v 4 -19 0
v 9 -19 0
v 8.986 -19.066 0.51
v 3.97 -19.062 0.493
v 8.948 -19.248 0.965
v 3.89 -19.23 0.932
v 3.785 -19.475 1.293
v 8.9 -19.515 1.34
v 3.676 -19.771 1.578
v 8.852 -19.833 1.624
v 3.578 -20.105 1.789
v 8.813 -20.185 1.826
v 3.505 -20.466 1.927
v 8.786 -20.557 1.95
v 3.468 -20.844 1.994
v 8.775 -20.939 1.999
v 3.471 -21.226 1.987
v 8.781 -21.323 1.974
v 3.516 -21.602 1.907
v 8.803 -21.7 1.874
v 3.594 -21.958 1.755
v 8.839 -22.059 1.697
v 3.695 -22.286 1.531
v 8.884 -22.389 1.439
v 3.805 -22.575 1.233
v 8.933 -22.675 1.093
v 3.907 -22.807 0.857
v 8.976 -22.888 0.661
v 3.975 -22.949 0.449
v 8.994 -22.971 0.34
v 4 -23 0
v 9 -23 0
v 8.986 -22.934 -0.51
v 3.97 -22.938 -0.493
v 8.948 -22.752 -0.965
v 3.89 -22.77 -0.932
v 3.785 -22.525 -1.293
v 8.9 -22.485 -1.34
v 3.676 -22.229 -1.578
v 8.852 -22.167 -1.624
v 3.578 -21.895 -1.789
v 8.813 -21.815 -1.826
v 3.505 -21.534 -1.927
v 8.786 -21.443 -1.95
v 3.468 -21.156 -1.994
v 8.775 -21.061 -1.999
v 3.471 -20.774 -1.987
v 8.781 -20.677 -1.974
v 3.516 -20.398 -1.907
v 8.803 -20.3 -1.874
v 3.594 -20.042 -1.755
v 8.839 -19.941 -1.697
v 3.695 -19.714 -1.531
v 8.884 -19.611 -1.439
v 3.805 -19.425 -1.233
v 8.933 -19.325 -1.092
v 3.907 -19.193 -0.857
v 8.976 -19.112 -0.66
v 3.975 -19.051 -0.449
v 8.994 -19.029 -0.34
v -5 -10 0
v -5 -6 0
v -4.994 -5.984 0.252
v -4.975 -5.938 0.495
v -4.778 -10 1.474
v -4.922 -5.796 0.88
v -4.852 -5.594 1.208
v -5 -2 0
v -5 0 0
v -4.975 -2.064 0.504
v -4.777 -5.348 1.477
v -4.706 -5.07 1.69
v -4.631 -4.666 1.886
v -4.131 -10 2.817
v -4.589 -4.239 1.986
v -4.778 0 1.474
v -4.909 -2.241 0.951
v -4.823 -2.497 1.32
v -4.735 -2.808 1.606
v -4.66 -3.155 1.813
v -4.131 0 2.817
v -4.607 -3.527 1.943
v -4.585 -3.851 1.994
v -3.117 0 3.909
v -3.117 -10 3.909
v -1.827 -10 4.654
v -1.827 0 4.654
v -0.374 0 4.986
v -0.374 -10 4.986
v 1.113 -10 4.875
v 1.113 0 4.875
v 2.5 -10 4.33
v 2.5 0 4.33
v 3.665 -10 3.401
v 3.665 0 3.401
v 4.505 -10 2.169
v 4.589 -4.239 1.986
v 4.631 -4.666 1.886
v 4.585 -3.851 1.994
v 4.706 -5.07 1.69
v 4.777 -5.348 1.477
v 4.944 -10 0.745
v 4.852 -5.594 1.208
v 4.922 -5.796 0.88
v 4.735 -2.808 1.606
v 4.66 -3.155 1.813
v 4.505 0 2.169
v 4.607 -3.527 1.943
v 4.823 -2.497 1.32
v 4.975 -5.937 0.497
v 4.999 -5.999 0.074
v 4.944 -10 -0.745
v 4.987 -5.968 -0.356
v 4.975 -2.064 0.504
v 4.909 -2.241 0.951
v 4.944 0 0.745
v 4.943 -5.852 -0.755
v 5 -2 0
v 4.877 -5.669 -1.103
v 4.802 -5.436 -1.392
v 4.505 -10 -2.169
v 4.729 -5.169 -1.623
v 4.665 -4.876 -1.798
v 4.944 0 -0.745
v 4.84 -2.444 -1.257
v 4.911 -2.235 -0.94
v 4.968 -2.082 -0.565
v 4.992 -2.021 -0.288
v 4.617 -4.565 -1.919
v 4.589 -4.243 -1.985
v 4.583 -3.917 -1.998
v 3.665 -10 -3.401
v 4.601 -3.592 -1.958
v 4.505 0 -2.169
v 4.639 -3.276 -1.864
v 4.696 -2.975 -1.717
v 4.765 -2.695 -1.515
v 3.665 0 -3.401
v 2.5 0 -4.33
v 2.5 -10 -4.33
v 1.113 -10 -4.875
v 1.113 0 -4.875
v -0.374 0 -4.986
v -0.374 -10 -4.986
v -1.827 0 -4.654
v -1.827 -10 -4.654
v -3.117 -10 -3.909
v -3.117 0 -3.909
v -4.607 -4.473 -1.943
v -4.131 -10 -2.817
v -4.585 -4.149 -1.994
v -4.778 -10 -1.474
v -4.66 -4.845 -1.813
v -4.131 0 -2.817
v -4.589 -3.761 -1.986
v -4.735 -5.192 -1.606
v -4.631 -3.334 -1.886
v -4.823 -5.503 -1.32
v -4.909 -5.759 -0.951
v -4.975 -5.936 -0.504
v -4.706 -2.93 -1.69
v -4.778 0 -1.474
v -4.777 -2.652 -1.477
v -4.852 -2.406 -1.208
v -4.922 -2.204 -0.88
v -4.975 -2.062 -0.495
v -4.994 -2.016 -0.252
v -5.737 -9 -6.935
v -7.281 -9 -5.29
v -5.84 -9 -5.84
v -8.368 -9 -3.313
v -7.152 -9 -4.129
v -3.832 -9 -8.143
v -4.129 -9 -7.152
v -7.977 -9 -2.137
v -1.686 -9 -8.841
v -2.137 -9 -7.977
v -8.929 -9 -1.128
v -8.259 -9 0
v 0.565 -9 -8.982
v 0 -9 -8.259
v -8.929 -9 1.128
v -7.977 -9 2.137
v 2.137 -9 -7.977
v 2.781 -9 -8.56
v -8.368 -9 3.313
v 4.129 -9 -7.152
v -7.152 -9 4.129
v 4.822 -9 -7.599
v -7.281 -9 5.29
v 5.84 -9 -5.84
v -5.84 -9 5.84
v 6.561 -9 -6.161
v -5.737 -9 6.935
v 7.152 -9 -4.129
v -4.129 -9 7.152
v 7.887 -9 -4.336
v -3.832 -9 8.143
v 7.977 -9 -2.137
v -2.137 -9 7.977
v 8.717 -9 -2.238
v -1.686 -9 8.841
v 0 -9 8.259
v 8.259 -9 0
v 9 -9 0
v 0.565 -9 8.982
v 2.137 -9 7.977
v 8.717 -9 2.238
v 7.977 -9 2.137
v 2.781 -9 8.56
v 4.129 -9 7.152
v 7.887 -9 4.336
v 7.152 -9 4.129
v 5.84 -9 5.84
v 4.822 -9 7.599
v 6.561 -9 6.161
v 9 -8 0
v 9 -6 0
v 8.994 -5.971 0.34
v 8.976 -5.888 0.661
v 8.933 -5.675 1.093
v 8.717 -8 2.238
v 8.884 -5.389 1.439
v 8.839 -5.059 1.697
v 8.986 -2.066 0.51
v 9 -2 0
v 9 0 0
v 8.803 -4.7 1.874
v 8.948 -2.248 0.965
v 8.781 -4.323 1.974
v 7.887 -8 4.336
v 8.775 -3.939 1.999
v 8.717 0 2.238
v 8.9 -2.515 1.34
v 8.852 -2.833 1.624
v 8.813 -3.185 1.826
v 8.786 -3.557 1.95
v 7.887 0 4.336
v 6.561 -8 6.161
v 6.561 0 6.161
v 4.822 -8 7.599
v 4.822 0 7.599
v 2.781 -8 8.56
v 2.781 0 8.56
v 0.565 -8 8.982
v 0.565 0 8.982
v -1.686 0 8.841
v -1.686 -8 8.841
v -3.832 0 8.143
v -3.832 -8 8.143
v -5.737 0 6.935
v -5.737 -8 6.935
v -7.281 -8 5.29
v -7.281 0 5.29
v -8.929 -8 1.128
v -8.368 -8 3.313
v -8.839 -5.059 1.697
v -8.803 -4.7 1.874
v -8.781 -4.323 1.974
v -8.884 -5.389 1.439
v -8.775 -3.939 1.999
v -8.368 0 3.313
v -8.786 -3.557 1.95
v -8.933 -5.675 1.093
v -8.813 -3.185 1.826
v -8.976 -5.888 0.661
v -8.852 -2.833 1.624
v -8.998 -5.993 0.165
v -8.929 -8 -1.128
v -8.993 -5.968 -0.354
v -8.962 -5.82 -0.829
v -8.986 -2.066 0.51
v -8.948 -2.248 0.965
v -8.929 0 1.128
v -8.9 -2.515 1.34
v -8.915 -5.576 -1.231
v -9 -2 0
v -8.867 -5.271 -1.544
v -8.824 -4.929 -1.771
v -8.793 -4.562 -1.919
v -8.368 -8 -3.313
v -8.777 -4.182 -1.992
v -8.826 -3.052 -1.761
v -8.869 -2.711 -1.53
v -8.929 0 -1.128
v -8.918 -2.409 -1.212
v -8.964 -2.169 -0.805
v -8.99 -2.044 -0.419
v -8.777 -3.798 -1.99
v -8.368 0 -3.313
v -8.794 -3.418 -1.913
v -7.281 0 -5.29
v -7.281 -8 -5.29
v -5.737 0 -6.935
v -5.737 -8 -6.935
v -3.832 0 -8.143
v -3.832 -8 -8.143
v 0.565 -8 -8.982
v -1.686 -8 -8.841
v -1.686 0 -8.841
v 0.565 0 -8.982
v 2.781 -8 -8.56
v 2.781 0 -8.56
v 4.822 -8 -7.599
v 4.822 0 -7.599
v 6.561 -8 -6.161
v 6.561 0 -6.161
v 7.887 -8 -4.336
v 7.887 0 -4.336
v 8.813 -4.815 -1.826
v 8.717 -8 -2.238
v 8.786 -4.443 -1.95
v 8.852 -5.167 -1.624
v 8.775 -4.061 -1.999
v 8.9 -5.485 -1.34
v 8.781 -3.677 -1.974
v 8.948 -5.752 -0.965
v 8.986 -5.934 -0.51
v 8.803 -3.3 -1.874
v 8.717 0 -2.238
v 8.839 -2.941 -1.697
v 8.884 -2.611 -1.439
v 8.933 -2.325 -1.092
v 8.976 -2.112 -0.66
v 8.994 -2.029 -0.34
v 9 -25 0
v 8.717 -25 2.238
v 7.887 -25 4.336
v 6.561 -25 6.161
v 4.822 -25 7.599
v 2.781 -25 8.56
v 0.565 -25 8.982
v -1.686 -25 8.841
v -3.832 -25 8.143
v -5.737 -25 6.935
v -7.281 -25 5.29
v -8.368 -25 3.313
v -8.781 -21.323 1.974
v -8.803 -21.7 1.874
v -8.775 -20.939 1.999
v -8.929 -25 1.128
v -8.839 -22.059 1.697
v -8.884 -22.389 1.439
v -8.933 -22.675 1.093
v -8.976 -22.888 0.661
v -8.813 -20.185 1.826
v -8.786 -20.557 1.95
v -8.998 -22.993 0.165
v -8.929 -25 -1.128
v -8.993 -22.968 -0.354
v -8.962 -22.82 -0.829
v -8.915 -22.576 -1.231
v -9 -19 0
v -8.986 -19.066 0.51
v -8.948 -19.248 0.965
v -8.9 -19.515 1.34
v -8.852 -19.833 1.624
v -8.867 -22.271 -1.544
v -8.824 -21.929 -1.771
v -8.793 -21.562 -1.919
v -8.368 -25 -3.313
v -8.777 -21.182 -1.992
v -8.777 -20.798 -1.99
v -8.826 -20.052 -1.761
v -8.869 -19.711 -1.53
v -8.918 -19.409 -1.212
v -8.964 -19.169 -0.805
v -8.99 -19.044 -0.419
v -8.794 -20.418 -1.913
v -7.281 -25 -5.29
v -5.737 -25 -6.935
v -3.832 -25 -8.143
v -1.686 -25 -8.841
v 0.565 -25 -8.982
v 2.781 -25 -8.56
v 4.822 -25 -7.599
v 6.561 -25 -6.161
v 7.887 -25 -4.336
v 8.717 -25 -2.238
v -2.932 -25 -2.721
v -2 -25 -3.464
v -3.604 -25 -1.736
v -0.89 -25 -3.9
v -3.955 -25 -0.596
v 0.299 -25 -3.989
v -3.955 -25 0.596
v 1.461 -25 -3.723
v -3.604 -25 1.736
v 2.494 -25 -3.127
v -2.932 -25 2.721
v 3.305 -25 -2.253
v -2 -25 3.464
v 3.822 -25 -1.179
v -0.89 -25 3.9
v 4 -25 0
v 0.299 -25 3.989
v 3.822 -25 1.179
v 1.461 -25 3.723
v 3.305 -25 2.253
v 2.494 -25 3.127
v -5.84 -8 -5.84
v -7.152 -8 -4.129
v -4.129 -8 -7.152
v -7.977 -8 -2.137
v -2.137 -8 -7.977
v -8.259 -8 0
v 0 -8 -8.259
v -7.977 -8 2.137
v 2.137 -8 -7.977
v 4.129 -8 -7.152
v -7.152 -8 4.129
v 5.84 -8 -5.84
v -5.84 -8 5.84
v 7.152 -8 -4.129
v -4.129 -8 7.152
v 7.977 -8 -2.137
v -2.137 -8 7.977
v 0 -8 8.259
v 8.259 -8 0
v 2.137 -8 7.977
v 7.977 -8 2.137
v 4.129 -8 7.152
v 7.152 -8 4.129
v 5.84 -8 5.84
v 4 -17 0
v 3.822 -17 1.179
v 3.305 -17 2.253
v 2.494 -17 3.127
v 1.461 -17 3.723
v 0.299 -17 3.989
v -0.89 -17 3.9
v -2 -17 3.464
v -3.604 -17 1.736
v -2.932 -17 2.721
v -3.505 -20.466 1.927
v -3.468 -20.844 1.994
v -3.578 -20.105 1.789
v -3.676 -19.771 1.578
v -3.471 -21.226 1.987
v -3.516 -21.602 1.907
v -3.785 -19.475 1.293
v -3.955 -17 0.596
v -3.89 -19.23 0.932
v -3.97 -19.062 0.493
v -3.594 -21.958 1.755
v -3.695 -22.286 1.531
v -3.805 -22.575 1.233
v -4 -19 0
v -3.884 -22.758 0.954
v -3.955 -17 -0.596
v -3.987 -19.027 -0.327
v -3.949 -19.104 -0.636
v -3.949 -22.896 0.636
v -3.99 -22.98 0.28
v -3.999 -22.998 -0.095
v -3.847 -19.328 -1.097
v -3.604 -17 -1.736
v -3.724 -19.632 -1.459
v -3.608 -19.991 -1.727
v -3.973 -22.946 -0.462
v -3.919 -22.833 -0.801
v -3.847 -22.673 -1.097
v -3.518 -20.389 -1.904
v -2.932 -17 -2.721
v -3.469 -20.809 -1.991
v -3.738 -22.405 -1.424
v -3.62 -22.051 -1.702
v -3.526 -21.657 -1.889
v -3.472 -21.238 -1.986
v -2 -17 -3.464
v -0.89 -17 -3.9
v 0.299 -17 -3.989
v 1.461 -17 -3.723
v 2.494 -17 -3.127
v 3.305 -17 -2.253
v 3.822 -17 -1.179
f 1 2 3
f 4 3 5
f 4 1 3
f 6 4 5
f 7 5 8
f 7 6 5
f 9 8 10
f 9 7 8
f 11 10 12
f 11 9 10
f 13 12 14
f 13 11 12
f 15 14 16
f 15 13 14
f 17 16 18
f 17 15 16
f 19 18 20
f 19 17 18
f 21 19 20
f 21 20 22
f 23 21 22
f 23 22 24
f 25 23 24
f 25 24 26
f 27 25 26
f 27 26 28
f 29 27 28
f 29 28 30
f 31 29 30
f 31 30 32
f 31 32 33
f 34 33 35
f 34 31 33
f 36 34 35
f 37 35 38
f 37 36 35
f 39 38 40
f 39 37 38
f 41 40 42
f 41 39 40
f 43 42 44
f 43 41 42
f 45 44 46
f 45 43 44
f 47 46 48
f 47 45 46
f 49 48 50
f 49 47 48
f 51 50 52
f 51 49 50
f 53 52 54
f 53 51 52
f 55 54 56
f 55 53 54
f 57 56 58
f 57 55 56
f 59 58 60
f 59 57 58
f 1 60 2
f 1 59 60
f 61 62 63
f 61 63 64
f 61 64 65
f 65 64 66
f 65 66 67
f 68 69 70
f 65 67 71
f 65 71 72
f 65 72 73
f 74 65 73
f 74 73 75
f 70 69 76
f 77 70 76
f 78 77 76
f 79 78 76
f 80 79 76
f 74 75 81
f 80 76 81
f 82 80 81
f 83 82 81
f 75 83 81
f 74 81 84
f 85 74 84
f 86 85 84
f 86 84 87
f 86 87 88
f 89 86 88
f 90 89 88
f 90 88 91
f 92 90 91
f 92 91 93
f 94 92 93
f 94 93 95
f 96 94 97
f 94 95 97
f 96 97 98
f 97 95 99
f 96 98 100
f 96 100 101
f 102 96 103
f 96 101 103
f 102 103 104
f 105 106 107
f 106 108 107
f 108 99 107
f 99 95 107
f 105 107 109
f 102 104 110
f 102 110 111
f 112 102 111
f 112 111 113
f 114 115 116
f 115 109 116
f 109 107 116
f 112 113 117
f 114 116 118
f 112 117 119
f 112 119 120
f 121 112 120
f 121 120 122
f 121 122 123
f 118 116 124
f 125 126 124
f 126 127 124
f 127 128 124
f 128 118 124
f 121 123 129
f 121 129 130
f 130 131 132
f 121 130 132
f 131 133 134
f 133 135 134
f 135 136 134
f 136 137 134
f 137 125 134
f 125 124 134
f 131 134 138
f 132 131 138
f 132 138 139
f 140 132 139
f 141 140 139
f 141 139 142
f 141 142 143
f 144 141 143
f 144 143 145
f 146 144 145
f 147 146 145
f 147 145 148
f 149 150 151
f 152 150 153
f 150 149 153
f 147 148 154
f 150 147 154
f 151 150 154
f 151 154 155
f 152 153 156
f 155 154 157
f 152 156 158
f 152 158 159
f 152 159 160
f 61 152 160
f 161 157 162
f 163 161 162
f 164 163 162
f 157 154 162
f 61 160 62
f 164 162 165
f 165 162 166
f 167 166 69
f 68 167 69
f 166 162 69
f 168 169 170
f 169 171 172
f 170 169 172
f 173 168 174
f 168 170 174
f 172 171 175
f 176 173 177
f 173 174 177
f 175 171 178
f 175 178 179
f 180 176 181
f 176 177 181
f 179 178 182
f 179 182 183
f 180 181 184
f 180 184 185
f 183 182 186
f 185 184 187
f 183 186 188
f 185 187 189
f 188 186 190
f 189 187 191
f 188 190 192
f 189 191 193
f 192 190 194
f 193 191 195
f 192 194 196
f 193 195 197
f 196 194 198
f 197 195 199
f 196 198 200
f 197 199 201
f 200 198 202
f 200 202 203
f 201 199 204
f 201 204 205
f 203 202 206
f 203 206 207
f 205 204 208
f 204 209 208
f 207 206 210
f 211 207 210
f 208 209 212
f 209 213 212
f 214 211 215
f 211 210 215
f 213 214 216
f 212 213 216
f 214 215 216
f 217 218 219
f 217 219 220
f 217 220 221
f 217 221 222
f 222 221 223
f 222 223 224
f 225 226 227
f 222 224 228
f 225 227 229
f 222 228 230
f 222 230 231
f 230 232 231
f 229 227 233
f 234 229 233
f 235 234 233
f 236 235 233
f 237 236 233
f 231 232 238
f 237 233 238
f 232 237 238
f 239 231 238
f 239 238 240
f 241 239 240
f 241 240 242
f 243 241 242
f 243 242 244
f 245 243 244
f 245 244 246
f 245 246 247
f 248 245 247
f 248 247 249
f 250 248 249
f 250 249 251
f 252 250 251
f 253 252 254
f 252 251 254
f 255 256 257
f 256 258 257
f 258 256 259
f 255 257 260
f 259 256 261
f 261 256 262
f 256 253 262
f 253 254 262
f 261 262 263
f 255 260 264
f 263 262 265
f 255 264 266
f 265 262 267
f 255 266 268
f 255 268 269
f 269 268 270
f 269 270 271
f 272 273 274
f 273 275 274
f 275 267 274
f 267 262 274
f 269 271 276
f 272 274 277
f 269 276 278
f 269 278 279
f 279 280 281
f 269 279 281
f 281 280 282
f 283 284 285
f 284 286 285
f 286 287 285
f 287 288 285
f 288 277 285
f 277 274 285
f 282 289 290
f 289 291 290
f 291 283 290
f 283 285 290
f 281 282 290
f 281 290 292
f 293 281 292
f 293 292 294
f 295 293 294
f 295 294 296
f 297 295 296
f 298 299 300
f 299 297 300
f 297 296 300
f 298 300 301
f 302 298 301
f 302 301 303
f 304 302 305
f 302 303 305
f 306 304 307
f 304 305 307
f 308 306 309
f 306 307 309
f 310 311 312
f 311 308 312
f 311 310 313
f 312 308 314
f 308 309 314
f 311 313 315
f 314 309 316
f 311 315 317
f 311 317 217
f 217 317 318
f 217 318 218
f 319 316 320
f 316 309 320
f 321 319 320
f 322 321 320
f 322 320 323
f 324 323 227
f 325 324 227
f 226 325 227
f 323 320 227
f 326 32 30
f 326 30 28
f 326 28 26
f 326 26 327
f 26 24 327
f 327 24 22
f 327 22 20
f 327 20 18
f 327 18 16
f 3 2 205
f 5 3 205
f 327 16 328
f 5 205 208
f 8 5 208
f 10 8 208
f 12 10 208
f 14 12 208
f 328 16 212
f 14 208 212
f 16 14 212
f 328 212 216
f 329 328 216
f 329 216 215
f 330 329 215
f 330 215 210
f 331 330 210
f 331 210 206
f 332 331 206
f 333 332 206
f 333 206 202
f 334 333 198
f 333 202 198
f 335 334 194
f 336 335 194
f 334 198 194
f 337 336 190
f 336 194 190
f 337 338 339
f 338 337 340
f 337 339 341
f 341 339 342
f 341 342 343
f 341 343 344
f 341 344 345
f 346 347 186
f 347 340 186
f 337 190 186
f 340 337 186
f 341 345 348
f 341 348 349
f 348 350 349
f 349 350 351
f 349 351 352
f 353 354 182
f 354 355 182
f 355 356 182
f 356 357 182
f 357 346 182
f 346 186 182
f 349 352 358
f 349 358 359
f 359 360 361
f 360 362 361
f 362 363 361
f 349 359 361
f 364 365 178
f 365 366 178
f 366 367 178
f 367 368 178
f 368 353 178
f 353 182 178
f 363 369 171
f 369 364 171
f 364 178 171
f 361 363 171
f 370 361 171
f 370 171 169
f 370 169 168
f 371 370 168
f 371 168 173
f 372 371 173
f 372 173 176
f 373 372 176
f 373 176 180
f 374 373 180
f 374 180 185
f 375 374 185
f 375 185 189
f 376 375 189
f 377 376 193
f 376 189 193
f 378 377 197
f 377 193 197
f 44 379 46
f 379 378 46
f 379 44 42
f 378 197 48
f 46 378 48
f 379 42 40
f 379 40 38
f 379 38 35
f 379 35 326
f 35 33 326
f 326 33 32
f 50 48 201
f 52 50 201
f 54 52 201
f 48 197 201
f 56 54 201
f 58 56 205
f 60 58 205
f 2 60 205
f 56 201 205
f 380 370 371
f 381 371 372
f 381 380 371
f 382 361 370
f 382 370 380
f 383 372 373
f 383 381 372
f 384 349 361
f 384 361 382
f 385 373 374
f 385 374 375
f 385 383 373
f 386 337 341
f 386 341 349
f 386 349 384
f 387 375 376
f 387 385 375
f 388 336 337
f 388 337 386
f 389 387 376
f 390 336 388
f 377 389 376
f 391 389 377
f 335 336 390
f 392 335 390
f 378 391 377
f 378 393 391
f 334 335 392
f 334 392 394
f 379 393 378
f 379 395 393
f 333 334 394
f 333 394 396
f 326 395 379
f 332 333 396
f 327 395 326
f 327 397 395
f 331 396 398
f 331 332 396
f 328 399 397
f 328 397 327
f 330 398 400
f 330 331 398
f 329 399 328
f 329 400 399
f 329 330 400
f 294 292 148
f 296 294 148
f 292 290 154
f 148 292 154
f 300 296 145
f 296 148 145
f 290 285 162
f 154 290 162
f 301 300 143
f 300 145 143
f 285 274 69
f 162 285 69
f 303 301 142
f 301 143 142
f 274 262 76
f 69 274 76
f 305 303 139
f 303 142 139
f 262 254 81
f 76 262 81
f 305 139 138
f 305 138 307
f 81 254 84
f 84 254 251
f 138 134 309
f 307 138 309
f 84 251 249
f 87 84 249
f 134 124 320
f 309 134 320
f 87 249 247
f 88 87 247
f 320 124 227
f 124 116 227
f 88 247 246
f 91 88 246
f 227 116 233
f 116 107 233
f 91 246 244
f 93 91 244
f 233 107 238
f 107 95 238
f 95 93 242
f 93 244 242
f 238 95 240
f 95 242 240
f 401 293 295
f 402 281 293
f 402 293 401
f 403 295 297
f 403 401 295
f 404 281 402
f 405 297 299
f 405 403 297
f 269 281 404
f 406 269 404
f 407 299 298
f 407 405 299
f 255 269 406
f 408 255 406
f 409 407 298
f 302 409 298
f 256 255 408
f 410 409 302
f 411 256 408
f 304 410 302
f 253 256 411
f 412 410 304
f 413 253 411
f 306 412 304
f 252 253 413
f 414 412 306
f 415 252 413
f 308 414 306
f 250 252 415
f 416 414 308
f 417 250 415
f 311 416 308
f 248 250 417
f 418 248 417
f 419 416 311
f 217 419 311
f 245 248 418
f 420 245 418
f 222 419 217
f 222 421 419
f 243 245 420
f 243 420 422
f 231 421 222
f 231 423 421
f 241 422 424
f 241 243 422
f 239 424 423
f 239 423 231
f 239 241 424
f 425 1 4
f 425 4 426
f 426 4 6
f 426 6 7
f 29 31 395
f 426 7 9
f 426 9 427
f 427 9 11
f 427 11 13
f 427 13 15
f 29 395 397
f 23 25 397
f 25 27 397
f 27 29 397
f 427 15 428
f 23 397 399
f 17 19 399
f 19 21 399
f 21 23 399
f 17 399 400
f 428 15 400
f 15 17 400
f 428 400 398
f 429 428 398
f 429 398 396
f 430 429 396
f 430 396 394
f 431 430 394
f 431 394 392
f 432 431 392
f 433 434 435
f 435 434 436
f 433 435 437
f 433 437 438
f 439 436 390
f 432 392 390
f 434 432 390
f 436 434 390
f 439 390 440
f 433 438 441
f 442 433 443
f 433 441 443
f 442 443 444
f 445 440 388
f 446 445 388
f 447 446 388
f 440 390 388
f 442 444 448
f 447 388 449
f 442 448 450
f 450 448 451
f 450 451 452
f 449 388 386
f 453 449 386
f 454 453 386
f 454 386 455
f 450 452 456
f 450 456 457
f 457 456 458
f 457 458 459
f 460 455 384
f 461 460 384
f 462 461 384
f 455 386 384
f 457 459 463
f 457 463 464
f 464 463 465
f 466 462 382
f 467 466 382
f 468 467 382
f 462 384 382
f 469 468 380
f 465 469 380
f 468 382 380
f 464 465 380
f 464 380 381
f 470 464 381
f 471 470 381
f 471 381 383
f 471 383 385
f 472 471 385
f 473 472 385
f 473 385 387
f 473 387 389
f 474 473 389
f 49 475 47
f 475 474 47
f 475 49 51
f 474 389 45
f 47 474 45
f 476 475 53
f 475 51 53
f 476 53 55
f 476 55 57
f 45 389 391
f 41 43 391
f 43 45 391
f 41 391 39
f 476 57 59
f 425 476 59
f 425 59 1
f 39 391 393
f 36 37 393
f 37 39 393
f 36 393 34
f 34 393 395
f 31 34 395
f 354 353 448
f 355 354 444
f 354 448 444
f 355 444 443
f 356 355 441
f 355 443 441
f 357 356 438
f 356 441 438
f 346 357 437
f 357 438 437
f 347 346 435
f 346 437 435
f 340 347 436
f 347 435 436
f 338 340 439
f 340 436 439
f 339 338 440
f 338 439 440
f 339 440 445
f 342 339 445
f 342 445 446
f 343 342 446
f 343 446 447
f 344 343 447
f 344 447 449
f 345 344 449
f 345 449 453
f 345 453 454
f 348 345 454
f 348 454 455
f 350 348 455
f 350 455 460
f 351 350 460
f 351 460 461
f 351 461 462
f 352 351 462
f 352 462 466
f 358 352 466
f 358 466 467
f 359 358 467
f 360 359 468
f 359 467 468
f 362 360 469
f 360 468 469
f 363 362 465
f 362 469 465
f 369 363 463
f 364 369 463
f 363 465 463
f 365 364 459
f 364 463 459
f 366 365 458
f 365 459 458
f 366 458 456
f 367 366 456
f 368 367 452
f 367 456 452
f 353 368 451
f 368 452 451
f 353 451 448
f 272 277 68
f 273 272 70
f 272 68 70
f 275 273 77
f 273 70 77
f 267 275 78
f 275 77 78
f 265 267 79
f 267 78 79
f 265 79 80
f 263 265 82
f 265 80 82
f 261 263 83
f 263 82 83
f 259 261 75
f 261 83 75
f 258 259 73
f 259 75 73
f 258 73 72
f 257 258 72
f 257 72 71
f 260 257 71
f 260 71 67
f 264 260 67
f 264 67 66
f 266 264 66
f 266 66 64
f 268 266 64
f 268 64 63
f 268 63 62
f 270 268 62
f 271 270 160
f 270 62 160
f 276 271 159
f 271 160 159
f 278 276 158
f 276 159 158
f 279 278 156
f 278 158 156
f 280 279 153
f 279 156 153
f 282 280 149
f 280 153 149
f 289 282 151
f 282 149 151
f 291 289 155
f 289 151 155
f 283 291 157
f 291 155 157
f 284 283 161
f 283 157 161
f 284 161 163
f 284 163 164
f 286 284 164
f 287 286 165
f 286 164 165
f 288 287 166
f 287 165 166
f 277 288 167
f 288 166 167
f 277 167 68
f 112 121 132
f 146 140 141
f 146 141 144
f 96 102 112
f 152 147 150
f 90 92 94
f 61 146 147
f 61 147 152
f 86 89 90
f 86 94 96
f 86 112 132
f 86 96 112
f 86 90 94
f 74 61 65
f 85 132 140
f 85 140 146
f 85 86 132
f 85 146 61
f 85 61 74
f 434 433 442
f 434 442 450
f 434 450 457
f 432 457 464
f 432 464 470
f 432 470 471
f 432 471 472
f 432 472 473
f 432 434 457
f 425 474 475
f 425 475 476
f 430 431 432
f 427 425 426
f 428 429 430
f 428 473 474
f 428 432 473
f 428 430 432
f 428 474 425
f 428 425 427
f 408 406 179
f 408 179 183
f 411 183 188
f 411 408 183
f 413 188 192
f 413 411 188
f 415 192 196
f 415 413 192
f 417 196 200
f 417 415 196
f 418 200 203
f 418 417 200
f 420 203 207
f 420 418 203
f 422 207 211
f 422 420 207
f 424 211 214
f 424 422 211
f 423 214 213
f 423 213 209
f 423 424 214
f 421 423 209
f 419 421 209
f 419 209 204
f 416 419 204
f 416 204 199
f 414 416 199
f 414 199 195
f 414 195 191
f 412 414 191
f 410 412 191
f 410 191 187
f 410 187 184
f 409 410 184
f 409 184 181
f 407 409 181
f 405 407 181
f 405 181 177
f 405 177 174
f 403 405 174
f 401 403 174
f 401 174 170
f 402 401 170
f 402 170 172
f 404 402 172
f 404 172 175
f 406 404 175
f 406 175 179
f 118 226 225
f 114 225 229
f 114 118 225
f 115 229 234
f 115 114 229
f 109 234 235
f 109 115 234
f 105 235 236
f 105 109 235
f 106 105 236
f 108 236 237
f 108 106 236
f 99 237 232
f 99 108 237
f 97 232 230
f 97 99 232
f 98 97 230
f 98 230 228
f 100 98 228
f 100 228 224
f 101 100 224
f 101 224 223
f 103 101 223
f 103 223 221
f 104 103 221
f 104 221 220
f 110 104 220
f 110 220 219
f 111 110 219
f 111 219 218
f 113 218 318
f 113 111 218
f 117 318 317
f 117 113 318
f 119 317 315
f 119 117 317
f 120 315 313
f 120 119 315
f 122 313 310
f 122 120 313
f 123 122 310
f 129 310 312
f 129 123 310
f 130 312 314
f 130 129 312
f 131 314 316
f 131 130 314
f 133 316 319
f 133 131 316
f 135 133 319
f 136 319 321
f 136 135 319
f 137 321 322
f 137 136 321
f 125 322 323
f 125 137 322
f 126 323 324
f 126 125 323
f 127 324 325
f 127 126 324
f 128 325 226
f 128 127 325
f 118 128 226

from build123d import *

# Parameters (mm, degrees)
F0_R          = 9
F1_DEPTH      = 25
F2_R          = 5
F3_DEPTH      = 10
F4_R          = 4
F5_DEPTH      = 8
F6_R          = 2
F7_DEPTH      = 9.001
F7_DEPTH_BACK = 9.001
F9_R          = 9.6900130566
F10_DEPTH     = 1
F11_R         = 8.2586159941
F12_DEPTH     = 17.0010001


with BuildPart() as f1:
    # F0 (on Front) → F1 (new body)
    with BuildSketch(Plane.XZ):
        Circle(F0_R)
    extrude(amount=F1_DEPTH)

    # F2 (on face) → F3 (cut)
    with BuildSketch(Plane(origin=(0, 0, 0), x_dir=(-1, 0, 0), z_dir=(0, 1, 0))):
        Circle(F2_R)
    extrude(amount=-F3_DEPTH, mode=Mode.SUBTRACT)

    # F4 (on face) → F5 (cut)
    with BuildSketch(Plane.XZ.offset(25)):
        Circle(F4_R)
    extrude(amount=-F5_DEPTH, mode=Mode.SUBTRACT)

    # F6 (on Right) → F7 (cut, two sides)
    with BuildSketch(Plane.YZ) as f7_sk:
        with Locations((-21, 0)):
            Circle(F6_R)
        with Locations((-4, 0)):
            Circle(F6_R)
    extrude(amount=-F7_DEPTH, mode=Mode.SUBTRACT)
    extrude(f7_sk.sketch, amount=F7_DEPTH_BACK, mode=Mode.SUBTRACT)


with BuildPart() as f10:
    # F9 (on offset) → F10 (new body)
    with BuildSketch(Plane.XZ.offset(8)):
        Circle(F9_R)
    extrude(amount=F10_DEPTH)

    # F11 (on face) → F12 (cut, through all)
    with BuildSketch(Plane(origin=(0, -8, 0), x_dir=(-1, 0, 0), z_dir=(0, 1, 0))):
        Circle(F11_R)
    extrude(amount=-F12_DEPTH, mode=Mode.SUBTRACT)


with BuildPart() as f1_1:
    add(f1.part)

    # F13: cut F10
    add(f10.part, mode=Mode.SUBTRACT)


solid = f1_1.part
